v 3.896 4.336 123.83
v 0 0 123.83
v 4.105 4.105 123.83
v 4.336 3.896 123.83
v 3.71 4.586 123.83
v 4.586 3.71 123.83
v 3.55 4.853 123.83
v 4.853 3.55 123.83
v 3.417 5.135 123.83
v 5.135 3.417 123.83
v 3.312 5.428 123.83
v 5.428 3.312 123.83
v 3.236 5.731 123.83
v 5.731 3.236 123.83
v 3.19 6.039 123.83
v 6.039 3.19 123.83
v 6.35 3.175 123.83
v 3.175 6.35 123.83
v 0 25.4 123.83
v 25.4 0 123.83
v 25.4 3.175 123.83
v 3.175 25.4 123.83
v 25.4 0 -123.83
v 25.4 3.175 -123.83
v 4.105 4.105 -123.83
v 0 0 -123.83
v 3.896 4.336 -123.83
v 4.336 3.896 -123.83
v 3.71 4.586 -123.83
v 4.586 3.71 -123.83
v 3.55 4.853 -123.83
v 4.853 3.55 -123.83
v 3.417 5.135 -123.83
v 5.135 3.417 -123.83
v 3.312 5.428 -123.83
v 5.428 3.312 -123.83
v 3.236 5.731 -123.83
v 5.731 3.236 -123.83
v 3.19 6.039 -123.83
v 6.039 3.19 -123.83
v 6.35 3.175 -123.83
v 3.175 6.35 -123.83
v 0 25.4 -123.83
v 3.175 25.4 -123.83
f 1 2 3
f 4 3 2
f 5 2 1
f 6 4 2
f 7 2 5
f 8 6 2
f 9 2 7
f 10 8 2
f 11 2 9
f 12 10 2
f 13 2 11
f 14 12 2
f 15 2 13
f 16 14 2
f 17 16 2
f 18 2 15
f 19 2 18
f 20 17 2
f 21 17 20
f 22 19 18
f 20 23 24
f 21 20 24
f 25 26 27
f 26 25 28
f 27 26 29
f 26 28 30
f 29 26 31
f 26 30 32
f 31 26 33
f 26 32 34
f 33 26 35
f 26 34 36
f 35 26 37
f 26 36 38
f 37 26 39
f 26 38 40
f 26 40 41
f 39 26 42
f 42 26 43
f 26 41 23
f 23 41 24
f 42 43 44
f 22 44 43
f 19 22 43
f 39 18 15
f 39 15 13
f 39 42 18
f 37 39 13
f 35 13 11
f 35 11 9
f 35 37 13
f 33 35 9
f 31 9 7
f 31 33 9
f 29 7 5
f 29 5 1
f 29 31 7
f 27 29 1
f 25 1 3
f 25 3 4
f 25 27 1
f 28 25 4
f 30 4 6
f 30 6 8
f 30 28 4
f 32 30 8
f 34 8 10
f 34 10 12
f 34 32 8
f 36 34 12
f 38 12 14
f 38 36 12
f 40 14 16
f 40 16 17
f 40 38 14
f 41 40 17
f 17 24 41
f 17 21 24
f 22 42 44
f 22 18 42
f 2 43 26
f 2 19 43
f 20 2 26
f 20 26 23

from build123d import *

# Parameters (mm, degrees)
BOSS_EXTRUDE1_DEPTH = 123.83
FILLET1_R           = 3.175


with BuildPart() as part:
    # Sketch1 → Boss-Extrude1 (new body, symmetric)
    with BuildSketch(Plane.XY):
        Polygon((0, 25.4), (0, 0), (25.4, 0), (25.4, 3.175), (3.175, 3.175), (3.175, 25.4), align=None)
    extrude(amount=BOSS_EXTRUDE1_DEPTH, both=True)

    # Fillet1
    fillet1_edges = [part.edges().sort_by_distance(p)[0] for p in [
        (3.175, 3.175, 0),
    ]]
    fillet(fillet1_edges, radius=FILLET1_R)


solid = part.part
